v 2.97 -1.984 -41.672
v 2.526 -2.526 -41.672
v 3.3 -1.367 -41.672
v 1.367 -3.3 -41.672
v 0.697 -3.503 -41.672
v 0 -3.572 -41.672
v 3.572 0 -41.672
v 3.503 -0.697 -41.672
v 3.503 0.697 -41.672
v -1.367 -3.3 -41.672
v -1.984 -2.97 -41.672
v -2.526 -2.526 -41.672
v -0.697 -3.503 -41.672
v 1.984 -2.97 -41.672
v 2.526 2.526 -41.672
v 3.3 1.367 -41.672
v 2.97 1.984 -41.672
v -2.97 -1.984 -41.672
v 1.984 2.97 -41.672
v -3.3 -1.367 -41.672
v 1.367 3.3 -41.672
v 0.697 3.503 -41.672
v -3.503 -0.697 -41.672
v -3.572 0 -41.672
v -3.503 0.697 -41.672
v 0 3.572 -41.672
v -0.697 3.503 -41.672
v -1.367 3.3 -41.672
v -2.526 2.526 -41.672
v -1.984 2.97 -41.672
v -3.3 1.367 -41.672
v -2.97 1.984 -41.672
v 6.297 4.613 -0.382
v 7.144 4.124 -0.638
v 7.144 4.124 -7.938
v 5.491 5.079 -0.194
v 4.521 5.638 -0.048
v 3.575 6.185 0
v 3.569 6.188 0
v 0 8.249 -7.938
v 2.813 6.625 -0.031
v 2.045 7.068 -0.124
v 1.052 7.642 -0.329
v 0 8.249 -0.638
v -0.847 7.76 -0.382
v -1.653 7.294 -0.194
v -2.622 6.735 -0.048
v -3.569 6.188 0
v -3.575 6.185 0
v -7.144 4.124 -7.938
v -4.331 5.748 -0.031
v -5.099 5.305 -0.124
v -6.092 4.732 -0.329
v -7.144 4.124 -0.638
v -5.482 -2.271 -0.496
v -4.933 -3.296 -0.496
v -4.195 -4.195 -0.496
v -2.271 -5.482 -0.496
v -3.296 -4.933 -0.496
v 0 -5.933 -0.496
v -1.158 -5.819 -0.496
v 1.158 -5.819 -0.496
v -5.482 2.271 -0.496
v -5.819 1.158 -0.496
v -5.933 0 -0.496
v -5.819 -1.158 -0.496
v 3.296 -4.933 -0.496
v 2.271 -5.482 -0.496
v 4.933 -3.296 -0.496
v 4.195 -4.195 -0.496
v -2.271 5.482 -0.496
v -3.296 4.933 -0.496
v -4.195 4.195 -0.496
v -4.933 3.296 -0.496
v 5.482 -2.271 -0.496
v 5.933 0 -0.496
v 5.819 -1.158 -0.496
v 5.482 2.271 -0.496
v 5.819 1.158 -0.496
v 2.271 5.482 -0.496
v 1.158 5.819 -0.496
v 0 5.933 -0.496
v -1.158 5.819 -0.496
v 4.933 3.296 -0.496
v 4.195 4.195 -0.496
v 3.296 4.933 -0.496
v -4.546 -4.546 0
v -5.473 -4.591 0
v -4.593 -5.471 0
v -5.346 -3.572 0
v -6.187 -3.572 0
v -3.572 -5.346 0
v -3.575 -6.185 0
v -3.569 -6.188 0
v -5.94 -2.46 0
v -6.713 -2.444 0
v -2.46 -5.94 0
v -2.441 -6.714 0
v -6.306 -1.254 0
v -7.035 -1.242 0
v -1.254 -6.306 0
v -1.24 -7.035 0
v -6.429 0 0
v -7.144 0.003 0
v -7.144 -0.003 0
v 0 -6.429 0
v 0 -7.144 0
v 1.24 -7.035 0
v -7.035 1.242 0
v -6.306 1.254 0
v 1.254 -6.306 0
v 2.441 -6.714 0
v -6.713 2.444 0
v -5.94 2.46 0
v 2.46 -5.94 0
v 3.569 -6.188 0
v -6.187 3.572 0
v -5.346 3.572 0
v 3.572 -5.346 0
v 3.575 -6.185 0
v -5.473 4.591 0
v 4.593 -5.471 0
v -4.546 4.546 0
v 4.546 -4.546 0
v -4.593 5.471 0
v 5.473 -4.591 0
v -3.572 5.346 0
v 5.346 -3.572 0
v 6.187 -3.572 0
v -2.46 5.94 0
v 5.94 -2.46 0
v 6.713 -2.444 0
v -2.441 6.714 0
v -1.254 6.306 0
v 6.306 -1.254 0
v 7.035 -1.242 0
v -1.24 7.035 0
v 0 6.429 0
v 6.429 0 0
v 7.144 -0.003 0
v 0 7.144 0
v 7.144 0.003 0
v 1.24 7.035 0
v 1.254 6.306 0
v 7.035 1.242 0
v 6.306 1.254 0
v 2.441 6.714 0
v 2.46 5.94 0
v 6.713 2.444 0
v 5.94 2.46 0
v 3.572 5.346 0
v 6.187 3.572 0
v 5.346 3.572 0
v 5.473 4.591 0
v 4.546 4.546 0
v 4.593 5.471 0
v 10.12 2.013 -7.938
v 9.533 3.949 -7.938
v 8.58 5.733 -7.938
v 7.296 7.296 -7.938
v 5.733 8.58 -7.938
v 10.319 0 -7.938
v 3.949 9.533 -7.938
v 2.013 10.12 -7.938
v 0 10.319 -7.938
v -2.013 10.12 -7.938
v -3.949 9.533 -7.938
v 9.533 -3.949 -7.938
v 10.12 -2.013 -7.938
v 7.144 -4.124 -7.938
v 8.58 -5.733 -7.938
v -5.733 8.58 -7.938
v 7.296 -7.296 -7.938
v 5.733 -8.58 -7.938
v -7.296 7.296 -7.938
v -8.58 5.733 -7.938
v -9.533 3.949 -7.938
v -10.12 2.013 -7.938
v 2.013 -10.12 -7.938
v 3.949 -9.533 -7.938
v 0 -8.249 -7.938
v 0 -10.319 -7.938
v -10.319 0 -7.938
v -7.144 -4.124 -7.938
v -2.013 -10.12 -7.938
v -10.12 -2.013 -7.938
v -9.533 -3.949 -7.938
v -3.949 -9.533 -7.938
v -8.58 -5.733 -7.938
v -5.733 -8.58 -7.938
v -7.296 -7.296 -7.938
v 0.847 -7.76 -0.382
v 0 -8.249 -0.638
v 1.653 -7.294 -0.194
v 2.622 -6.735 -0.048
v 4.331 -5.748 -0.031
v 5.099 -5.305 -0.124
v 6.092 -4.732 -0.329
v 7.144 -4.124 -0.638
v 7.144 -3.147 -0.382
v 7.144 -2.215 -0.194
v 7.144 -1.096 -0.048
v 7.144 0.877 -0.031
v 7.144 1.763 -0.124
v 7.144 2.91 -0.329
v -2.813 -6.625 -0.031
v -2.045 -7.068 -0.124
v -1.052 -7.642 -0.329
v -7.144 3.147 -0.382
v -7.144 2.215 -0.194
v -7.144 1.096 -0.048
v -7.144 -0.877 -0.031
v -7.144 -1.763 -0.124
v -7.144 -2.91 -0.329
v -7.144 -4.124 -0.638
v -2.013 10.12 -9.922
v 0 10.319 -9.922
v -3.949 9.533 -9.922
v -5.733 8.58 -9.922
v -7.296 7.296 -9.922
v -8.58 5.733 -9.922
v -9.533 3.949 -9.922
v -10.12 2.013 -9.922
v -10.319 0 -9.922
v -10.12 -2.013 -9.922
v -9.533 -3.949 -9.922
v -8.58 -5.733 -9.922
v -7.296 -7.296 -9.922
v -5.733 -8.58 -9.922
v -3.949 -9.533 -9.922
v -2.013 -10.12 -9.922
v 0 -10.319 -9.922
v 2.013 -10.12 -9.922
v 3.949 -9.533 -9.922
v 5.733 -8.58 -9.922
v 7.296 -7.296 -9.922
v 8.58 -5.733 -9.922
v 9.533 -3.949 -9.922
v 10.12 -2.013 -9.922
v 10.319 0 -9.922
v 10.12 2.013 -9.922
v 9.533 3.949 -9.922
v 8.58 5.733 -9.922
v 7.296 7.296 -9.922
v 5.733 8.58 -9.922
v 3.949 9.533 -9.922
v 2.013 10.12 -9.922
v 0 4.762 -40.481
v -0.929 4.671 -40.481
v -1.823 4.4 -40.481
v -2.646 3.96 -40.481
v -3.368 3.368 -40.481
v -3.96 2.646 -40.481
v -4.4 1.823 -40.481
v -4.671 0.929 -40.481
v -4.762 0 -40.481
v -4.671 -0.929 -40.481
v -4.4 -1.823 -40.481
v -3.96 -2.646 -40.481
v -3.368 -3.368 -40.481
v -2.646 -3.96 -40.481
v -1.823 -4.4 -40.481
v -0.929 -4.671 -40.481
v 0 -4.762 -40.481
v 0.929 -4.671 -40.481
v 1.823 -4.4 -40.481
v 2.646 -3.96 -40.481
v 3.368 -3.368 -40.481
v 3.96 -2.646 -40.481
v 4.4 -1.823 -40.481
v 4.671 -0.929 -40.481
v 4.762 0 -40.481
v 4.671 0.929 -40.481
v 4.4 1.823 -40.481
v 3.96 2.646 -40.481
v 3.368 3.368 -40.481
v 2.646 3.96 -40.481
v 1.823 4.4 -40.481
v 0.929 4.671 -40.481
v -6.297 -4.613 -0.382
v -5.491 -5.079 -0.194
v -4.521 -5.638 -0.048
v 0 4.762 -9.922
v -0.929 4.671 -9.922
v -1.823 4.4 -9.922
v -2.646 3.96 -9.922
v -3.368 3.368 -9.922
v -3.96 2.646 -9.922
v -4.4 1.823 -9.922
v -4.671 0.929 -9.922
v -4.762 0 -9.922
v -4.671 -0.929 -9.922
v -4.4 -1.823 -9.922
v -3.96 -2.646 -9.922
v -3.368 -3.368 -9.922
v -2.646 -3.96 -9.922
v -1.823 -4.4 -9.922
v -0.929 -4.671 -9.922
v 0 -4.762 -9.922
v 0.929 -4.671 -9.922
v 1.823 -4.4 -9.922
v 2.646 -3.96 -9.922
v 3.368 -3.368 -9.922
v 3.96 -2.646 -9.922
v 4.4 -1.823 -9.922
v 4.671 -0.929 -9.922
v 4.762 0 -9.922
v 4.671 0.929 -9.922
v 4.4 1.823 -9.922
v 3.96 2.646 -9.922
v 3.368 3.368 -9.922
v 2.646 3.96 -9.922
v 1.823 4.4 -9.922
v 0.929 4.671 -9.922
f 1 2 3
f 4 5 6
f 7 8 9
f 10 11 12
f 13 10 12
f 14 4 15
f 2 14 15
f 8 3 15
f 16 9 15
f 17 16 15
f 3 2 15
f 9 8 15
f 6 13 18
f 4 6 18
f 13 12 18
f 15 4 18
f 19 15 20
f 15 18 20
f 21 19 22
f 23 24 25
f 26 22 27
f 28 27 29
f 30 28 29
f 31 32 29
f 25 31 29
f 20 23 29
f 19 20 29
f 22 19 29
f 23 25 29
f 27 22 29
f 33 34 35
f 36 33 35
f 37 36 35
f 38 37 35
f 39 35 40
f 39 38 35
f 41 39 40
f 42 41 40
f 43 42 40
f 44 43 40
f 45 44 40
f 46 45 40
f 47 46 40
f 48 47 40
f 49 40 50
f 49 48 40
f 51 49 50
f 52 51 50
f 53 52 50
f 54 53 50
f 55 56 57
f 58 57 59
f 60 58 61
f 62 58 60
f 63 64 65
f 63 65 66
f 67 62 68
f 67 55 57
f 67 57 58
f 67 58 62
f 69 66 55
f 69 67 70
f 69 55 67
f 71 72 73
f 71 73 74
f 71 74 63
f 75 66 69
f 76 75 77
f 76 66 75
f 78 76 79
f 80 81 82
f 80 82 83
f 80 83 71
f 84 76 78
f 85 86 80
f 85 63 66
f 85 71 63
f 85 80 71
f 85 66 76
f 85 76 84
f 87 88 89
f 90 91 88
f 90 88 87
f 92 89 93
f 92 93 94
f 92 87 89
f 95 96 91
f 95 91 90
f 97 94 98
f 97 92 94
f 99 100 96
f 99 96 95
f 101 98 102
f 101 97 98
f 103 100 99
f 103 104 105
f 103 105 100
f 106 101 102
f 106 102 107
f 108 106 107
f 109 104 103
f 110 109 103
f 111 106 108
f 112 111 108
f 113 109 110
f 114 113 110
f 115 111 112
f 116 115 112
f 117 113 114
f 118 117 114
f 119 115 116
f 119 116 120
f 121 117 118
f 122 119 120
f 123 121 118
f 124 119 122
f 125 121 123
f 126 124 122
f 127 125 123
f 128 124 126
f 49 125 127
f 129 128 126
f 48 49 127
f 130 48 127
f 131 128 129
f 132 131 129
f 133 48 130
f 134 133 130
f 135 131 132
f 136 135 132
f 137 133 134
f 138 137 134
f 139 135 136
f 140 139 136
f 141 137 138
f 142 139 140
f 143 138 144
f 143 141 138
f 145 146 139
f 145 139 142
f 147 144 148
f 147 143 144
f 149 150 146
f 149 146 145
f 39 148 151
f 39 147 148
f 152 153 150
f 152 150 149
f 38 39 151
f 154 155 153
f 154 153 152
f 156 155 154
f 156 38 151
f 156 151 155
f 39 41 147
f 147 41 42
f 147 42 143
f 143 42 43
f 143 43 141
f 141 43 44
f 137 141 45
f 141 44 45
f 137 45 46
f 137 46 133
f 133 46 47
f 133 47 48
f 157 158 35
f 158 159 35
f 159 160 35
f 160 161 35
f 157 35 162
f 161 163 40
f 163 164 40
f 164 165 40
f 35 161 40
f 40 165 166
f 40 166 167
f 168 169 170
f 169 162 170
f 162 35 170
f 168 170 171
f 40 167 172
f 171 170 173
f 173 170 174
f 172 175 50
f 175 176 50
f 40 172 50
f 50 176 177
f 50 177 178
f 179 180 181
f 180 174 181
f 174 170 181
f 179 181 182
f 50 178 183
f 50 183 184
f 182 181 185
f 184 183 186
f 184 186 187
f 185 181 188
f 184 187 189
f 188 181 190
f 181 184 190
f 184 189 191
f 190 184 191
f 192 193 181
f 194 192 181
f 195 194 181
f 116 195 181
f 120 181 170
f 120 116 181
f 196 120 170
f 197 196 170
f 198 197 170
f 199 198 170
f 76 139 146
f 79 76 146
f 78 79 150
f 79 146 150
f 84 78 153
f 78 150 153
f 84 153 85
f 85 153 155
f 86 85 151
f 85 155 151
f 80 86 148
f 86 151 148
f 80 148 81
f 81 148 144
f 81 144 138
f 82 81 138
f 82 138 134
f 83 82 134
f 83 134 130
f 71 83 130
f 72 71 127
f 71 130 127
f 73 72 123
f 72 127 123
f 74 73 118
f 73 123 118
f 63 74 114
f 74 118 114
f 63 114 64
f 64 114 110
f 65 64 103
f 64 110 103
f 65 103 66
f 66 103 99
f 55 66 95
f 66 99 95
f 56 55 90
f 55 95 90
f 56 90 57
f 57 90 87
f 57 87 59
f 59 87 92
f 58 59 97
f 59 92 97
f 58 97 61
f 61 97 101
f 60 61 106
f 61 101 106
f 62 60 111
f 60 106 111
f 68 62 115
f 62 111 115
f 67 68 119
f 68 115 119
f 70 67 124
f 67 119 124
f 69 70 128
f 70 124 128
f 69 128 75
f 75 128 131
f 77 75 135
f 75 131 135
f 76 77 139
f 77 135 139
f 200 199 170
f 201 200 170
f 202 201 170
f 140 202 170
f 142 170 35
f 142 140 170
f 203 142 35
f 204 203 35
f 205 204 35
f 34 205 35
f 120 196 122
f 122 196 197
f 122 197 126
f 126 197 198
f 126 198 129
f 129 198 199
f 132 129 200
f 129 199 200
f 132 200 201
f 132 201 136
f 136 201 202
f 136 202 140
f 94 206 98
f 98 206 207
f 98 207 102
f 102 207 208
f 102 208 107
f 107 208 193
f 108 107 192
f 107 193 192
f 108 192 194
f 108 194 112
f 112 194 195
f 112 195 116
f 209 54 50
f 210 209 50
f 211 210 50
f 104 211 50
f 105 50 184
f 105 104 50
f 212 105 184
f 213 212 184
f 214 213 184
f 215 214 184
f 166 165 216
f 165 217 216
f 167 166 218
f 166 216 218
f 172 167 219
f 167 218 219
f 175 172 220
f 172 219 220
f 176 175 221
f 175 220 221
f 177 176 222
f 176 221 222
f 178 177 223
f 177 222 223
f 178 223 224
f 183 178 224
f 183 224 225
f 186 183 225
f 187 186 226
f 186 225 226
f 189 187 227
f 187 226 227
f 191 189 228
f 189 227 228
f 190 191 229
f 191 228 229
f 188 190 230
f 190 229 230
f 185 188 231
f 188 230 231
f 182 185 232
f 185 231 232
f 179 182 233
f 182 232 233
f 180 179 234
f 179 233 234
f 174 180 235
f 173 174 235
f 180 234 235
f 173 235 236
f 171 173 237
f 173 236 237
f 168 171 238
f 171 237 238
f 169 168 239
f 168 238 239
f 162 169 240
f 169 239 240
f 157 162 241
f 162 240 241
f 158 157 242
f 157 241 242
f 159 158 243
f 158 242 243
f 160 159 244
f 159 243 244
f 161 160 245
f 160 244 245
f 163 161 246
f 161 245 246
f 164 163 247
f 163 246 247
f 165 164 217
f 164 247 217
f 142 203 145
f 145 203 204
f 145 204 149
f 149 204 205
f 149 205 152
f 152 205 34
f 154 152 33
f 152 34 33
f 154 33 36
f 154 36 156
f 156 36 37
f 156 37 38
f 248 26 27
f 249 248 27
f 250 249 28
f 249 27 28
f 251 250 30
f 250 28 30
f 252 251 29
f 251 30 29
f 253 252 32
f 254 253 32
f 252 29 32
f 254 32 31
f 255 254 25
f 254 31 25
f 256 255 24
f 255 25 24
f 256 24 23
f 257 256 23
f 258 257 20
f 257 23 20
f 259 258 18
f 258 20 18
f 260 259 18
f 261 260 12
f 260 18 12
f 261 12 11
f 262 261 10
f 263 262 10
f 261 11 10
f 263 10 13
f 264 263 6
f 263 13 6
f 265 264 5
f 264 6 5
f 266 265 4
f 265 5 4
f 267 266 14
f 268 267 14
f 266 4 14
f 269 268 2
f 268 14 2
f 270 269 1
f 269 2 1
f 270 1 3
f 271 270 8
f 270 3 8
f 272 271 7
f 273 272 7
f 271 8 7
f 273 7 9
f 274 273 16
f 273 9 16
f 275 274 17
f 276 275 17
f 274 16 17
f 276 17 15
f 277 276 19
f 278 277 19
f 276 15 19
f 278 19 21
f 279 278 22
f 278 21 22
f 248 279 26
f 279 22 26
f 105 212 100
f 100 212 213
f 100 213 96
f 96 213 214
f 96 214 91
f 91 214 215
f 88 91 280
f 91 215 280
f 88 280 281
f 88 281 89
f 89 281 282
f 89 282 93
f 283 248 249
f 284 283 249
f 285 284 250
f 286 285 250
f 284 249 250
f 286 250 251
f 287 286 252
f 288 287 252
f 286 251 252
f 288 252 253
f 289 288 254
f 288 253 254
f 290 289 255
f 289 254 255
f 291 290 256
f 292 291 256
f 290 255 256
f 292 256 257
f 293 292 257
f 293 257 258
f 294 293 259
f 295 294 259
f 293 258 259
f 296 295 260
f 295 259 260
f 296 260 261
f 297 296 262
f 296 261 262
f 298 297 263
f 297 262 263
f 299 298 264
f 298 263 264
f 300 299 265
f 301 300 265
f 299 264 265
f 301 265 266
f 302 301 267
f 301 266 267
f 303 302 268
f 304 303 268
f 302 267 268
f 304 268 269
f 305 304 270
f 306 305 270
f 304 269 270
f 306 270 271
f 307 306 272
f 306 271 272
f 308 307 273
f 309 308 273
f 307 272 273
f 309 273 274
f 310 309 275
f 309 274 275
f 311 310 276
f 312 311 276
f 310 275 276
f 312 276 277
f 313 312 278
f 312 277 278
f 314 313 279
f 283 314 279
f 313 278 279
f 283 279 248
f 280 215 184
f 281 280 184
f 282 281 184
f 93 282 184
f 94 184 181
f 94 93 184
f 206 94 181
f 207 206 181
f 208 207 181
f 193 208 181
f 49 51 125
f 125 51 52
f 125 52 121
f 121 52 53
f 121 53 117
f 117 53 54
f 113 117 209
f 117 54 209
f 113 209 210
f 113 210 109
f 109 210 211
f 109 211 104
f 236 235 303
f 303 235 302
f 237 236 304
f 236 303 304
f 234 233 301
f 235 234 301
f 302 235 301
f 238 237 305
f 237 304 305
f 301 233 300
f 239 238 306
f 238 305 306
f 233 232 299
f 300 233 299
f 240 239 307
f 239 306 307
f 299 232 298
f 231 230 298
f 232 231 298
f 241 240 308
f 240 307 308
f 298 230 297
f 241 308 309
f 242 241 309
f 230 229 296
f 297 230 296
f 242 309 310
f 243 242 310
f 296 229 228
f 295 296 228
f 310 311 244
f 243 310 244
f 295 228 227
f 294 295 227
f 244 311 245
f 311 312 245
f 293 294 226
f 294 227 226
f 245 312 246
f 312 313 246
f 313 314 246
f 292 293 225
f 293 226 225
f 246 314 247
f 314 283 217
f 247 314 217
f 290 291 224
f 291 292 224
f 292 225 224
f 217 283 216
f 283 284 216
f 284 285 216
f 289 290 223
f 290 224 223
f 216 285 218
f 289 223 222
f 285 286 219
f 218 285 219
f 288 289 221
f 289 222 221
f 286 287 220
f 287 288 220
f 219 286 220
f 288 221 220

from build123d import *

# Parameters (mm, degrees)
BOSS_EXTRUDE1_DEPTH = 7.9375
SKETCH3_R           = 6.429375
CUT_EXTRUDE1_DEPTH  = 0.49609375
CUT_EXTRUDE1_DRAFT  = -45
CHAMFER1_SIZE       = 1.190625


# Read off the part's stored shape, not the designer's step: Cut-Extrude2
with BuildPart() as part:
    # Sketch1 → Revolve1 (revolve)
    with BuildSketch(Plane(origin=(0, 0, 0), x_dir=(0, 0, -1), z_dir=(1, 0, 0))):
        Polygon((9.921875, 4.7625), (41.671875, 4.7625), (41.671875, 0), (0, 0), (0, 7.14375), (7.9375, 7.14375), (7.9375, 10.31875), (9.921875, 10.31875), align=None)
    revolve(axis=Axis((0, 0, -41.671875), (0, 0, 1)))

    # Sketch2 → Boss-Extrude1 (add)
    with BuildSketch(Plane.XY):
        Polygon((7.14375, 4.124445986), (0, 8.248891971), (-7.14375, 4.124445986), (-7.14375, -4.124445986), (0, -8.248891971), (7.14375, -4.124445986), align=None)
    extrude(amount=-BOSS_EXTRUDE1_DEPTH)

    # Cut-Extrude2 outline → Cut-Extrude2 (revolve, cut)
    with BuildSketch(Plane.XZ):
        Polygon((8.248891975, 1.48e-06), (7.143748081, 1.48e-06), (8.248891975, -0.638054017), align=None)
    revolve(axis=Axis((0, 0, 0), (0, 0, 1)), mode=Mode.SUBTRACT)


with BuildPart() as cut_extrude1_tool:
    # Sketch3 → Cut-Extrude1 (with draft: the straight prism first)
    with BuildSketch(Plane.XY):
        Circle(SKETCH3_R)
    extrude(amount=-CUT_EXTRUDE1_DEPTH)
    # Cut-Extrude1: the draft: its side faces are tilted about the plane it starts from
    cut_extrude1_sides = [cut_extrude1_tool.faces().sort_by_distance(p)[0] for p in [
        (-6.429375, 0, -0.248046875),
    ]]
    draft(cut_extrude1_sides, Plane.XY, CUT_EXTRUDE1_DRAFT)


with BuildPart() as part_1:
    add(part.part)

    # Cut-Extrude1: cut by cut_extrude1_tool
    add(cut_extrude1_tool.part, mode=Mode.SUBTRACT)

    # Chamfer1
    chamfer1_edges = [part_1.edges().sort_by_distance(p)[0] for p in [
        (0, -4.7625, -41.671875),
    ]]
    chamfer(chamfer1_edges, length=CHAMFER1_SIZE)


solid = part_1.part
